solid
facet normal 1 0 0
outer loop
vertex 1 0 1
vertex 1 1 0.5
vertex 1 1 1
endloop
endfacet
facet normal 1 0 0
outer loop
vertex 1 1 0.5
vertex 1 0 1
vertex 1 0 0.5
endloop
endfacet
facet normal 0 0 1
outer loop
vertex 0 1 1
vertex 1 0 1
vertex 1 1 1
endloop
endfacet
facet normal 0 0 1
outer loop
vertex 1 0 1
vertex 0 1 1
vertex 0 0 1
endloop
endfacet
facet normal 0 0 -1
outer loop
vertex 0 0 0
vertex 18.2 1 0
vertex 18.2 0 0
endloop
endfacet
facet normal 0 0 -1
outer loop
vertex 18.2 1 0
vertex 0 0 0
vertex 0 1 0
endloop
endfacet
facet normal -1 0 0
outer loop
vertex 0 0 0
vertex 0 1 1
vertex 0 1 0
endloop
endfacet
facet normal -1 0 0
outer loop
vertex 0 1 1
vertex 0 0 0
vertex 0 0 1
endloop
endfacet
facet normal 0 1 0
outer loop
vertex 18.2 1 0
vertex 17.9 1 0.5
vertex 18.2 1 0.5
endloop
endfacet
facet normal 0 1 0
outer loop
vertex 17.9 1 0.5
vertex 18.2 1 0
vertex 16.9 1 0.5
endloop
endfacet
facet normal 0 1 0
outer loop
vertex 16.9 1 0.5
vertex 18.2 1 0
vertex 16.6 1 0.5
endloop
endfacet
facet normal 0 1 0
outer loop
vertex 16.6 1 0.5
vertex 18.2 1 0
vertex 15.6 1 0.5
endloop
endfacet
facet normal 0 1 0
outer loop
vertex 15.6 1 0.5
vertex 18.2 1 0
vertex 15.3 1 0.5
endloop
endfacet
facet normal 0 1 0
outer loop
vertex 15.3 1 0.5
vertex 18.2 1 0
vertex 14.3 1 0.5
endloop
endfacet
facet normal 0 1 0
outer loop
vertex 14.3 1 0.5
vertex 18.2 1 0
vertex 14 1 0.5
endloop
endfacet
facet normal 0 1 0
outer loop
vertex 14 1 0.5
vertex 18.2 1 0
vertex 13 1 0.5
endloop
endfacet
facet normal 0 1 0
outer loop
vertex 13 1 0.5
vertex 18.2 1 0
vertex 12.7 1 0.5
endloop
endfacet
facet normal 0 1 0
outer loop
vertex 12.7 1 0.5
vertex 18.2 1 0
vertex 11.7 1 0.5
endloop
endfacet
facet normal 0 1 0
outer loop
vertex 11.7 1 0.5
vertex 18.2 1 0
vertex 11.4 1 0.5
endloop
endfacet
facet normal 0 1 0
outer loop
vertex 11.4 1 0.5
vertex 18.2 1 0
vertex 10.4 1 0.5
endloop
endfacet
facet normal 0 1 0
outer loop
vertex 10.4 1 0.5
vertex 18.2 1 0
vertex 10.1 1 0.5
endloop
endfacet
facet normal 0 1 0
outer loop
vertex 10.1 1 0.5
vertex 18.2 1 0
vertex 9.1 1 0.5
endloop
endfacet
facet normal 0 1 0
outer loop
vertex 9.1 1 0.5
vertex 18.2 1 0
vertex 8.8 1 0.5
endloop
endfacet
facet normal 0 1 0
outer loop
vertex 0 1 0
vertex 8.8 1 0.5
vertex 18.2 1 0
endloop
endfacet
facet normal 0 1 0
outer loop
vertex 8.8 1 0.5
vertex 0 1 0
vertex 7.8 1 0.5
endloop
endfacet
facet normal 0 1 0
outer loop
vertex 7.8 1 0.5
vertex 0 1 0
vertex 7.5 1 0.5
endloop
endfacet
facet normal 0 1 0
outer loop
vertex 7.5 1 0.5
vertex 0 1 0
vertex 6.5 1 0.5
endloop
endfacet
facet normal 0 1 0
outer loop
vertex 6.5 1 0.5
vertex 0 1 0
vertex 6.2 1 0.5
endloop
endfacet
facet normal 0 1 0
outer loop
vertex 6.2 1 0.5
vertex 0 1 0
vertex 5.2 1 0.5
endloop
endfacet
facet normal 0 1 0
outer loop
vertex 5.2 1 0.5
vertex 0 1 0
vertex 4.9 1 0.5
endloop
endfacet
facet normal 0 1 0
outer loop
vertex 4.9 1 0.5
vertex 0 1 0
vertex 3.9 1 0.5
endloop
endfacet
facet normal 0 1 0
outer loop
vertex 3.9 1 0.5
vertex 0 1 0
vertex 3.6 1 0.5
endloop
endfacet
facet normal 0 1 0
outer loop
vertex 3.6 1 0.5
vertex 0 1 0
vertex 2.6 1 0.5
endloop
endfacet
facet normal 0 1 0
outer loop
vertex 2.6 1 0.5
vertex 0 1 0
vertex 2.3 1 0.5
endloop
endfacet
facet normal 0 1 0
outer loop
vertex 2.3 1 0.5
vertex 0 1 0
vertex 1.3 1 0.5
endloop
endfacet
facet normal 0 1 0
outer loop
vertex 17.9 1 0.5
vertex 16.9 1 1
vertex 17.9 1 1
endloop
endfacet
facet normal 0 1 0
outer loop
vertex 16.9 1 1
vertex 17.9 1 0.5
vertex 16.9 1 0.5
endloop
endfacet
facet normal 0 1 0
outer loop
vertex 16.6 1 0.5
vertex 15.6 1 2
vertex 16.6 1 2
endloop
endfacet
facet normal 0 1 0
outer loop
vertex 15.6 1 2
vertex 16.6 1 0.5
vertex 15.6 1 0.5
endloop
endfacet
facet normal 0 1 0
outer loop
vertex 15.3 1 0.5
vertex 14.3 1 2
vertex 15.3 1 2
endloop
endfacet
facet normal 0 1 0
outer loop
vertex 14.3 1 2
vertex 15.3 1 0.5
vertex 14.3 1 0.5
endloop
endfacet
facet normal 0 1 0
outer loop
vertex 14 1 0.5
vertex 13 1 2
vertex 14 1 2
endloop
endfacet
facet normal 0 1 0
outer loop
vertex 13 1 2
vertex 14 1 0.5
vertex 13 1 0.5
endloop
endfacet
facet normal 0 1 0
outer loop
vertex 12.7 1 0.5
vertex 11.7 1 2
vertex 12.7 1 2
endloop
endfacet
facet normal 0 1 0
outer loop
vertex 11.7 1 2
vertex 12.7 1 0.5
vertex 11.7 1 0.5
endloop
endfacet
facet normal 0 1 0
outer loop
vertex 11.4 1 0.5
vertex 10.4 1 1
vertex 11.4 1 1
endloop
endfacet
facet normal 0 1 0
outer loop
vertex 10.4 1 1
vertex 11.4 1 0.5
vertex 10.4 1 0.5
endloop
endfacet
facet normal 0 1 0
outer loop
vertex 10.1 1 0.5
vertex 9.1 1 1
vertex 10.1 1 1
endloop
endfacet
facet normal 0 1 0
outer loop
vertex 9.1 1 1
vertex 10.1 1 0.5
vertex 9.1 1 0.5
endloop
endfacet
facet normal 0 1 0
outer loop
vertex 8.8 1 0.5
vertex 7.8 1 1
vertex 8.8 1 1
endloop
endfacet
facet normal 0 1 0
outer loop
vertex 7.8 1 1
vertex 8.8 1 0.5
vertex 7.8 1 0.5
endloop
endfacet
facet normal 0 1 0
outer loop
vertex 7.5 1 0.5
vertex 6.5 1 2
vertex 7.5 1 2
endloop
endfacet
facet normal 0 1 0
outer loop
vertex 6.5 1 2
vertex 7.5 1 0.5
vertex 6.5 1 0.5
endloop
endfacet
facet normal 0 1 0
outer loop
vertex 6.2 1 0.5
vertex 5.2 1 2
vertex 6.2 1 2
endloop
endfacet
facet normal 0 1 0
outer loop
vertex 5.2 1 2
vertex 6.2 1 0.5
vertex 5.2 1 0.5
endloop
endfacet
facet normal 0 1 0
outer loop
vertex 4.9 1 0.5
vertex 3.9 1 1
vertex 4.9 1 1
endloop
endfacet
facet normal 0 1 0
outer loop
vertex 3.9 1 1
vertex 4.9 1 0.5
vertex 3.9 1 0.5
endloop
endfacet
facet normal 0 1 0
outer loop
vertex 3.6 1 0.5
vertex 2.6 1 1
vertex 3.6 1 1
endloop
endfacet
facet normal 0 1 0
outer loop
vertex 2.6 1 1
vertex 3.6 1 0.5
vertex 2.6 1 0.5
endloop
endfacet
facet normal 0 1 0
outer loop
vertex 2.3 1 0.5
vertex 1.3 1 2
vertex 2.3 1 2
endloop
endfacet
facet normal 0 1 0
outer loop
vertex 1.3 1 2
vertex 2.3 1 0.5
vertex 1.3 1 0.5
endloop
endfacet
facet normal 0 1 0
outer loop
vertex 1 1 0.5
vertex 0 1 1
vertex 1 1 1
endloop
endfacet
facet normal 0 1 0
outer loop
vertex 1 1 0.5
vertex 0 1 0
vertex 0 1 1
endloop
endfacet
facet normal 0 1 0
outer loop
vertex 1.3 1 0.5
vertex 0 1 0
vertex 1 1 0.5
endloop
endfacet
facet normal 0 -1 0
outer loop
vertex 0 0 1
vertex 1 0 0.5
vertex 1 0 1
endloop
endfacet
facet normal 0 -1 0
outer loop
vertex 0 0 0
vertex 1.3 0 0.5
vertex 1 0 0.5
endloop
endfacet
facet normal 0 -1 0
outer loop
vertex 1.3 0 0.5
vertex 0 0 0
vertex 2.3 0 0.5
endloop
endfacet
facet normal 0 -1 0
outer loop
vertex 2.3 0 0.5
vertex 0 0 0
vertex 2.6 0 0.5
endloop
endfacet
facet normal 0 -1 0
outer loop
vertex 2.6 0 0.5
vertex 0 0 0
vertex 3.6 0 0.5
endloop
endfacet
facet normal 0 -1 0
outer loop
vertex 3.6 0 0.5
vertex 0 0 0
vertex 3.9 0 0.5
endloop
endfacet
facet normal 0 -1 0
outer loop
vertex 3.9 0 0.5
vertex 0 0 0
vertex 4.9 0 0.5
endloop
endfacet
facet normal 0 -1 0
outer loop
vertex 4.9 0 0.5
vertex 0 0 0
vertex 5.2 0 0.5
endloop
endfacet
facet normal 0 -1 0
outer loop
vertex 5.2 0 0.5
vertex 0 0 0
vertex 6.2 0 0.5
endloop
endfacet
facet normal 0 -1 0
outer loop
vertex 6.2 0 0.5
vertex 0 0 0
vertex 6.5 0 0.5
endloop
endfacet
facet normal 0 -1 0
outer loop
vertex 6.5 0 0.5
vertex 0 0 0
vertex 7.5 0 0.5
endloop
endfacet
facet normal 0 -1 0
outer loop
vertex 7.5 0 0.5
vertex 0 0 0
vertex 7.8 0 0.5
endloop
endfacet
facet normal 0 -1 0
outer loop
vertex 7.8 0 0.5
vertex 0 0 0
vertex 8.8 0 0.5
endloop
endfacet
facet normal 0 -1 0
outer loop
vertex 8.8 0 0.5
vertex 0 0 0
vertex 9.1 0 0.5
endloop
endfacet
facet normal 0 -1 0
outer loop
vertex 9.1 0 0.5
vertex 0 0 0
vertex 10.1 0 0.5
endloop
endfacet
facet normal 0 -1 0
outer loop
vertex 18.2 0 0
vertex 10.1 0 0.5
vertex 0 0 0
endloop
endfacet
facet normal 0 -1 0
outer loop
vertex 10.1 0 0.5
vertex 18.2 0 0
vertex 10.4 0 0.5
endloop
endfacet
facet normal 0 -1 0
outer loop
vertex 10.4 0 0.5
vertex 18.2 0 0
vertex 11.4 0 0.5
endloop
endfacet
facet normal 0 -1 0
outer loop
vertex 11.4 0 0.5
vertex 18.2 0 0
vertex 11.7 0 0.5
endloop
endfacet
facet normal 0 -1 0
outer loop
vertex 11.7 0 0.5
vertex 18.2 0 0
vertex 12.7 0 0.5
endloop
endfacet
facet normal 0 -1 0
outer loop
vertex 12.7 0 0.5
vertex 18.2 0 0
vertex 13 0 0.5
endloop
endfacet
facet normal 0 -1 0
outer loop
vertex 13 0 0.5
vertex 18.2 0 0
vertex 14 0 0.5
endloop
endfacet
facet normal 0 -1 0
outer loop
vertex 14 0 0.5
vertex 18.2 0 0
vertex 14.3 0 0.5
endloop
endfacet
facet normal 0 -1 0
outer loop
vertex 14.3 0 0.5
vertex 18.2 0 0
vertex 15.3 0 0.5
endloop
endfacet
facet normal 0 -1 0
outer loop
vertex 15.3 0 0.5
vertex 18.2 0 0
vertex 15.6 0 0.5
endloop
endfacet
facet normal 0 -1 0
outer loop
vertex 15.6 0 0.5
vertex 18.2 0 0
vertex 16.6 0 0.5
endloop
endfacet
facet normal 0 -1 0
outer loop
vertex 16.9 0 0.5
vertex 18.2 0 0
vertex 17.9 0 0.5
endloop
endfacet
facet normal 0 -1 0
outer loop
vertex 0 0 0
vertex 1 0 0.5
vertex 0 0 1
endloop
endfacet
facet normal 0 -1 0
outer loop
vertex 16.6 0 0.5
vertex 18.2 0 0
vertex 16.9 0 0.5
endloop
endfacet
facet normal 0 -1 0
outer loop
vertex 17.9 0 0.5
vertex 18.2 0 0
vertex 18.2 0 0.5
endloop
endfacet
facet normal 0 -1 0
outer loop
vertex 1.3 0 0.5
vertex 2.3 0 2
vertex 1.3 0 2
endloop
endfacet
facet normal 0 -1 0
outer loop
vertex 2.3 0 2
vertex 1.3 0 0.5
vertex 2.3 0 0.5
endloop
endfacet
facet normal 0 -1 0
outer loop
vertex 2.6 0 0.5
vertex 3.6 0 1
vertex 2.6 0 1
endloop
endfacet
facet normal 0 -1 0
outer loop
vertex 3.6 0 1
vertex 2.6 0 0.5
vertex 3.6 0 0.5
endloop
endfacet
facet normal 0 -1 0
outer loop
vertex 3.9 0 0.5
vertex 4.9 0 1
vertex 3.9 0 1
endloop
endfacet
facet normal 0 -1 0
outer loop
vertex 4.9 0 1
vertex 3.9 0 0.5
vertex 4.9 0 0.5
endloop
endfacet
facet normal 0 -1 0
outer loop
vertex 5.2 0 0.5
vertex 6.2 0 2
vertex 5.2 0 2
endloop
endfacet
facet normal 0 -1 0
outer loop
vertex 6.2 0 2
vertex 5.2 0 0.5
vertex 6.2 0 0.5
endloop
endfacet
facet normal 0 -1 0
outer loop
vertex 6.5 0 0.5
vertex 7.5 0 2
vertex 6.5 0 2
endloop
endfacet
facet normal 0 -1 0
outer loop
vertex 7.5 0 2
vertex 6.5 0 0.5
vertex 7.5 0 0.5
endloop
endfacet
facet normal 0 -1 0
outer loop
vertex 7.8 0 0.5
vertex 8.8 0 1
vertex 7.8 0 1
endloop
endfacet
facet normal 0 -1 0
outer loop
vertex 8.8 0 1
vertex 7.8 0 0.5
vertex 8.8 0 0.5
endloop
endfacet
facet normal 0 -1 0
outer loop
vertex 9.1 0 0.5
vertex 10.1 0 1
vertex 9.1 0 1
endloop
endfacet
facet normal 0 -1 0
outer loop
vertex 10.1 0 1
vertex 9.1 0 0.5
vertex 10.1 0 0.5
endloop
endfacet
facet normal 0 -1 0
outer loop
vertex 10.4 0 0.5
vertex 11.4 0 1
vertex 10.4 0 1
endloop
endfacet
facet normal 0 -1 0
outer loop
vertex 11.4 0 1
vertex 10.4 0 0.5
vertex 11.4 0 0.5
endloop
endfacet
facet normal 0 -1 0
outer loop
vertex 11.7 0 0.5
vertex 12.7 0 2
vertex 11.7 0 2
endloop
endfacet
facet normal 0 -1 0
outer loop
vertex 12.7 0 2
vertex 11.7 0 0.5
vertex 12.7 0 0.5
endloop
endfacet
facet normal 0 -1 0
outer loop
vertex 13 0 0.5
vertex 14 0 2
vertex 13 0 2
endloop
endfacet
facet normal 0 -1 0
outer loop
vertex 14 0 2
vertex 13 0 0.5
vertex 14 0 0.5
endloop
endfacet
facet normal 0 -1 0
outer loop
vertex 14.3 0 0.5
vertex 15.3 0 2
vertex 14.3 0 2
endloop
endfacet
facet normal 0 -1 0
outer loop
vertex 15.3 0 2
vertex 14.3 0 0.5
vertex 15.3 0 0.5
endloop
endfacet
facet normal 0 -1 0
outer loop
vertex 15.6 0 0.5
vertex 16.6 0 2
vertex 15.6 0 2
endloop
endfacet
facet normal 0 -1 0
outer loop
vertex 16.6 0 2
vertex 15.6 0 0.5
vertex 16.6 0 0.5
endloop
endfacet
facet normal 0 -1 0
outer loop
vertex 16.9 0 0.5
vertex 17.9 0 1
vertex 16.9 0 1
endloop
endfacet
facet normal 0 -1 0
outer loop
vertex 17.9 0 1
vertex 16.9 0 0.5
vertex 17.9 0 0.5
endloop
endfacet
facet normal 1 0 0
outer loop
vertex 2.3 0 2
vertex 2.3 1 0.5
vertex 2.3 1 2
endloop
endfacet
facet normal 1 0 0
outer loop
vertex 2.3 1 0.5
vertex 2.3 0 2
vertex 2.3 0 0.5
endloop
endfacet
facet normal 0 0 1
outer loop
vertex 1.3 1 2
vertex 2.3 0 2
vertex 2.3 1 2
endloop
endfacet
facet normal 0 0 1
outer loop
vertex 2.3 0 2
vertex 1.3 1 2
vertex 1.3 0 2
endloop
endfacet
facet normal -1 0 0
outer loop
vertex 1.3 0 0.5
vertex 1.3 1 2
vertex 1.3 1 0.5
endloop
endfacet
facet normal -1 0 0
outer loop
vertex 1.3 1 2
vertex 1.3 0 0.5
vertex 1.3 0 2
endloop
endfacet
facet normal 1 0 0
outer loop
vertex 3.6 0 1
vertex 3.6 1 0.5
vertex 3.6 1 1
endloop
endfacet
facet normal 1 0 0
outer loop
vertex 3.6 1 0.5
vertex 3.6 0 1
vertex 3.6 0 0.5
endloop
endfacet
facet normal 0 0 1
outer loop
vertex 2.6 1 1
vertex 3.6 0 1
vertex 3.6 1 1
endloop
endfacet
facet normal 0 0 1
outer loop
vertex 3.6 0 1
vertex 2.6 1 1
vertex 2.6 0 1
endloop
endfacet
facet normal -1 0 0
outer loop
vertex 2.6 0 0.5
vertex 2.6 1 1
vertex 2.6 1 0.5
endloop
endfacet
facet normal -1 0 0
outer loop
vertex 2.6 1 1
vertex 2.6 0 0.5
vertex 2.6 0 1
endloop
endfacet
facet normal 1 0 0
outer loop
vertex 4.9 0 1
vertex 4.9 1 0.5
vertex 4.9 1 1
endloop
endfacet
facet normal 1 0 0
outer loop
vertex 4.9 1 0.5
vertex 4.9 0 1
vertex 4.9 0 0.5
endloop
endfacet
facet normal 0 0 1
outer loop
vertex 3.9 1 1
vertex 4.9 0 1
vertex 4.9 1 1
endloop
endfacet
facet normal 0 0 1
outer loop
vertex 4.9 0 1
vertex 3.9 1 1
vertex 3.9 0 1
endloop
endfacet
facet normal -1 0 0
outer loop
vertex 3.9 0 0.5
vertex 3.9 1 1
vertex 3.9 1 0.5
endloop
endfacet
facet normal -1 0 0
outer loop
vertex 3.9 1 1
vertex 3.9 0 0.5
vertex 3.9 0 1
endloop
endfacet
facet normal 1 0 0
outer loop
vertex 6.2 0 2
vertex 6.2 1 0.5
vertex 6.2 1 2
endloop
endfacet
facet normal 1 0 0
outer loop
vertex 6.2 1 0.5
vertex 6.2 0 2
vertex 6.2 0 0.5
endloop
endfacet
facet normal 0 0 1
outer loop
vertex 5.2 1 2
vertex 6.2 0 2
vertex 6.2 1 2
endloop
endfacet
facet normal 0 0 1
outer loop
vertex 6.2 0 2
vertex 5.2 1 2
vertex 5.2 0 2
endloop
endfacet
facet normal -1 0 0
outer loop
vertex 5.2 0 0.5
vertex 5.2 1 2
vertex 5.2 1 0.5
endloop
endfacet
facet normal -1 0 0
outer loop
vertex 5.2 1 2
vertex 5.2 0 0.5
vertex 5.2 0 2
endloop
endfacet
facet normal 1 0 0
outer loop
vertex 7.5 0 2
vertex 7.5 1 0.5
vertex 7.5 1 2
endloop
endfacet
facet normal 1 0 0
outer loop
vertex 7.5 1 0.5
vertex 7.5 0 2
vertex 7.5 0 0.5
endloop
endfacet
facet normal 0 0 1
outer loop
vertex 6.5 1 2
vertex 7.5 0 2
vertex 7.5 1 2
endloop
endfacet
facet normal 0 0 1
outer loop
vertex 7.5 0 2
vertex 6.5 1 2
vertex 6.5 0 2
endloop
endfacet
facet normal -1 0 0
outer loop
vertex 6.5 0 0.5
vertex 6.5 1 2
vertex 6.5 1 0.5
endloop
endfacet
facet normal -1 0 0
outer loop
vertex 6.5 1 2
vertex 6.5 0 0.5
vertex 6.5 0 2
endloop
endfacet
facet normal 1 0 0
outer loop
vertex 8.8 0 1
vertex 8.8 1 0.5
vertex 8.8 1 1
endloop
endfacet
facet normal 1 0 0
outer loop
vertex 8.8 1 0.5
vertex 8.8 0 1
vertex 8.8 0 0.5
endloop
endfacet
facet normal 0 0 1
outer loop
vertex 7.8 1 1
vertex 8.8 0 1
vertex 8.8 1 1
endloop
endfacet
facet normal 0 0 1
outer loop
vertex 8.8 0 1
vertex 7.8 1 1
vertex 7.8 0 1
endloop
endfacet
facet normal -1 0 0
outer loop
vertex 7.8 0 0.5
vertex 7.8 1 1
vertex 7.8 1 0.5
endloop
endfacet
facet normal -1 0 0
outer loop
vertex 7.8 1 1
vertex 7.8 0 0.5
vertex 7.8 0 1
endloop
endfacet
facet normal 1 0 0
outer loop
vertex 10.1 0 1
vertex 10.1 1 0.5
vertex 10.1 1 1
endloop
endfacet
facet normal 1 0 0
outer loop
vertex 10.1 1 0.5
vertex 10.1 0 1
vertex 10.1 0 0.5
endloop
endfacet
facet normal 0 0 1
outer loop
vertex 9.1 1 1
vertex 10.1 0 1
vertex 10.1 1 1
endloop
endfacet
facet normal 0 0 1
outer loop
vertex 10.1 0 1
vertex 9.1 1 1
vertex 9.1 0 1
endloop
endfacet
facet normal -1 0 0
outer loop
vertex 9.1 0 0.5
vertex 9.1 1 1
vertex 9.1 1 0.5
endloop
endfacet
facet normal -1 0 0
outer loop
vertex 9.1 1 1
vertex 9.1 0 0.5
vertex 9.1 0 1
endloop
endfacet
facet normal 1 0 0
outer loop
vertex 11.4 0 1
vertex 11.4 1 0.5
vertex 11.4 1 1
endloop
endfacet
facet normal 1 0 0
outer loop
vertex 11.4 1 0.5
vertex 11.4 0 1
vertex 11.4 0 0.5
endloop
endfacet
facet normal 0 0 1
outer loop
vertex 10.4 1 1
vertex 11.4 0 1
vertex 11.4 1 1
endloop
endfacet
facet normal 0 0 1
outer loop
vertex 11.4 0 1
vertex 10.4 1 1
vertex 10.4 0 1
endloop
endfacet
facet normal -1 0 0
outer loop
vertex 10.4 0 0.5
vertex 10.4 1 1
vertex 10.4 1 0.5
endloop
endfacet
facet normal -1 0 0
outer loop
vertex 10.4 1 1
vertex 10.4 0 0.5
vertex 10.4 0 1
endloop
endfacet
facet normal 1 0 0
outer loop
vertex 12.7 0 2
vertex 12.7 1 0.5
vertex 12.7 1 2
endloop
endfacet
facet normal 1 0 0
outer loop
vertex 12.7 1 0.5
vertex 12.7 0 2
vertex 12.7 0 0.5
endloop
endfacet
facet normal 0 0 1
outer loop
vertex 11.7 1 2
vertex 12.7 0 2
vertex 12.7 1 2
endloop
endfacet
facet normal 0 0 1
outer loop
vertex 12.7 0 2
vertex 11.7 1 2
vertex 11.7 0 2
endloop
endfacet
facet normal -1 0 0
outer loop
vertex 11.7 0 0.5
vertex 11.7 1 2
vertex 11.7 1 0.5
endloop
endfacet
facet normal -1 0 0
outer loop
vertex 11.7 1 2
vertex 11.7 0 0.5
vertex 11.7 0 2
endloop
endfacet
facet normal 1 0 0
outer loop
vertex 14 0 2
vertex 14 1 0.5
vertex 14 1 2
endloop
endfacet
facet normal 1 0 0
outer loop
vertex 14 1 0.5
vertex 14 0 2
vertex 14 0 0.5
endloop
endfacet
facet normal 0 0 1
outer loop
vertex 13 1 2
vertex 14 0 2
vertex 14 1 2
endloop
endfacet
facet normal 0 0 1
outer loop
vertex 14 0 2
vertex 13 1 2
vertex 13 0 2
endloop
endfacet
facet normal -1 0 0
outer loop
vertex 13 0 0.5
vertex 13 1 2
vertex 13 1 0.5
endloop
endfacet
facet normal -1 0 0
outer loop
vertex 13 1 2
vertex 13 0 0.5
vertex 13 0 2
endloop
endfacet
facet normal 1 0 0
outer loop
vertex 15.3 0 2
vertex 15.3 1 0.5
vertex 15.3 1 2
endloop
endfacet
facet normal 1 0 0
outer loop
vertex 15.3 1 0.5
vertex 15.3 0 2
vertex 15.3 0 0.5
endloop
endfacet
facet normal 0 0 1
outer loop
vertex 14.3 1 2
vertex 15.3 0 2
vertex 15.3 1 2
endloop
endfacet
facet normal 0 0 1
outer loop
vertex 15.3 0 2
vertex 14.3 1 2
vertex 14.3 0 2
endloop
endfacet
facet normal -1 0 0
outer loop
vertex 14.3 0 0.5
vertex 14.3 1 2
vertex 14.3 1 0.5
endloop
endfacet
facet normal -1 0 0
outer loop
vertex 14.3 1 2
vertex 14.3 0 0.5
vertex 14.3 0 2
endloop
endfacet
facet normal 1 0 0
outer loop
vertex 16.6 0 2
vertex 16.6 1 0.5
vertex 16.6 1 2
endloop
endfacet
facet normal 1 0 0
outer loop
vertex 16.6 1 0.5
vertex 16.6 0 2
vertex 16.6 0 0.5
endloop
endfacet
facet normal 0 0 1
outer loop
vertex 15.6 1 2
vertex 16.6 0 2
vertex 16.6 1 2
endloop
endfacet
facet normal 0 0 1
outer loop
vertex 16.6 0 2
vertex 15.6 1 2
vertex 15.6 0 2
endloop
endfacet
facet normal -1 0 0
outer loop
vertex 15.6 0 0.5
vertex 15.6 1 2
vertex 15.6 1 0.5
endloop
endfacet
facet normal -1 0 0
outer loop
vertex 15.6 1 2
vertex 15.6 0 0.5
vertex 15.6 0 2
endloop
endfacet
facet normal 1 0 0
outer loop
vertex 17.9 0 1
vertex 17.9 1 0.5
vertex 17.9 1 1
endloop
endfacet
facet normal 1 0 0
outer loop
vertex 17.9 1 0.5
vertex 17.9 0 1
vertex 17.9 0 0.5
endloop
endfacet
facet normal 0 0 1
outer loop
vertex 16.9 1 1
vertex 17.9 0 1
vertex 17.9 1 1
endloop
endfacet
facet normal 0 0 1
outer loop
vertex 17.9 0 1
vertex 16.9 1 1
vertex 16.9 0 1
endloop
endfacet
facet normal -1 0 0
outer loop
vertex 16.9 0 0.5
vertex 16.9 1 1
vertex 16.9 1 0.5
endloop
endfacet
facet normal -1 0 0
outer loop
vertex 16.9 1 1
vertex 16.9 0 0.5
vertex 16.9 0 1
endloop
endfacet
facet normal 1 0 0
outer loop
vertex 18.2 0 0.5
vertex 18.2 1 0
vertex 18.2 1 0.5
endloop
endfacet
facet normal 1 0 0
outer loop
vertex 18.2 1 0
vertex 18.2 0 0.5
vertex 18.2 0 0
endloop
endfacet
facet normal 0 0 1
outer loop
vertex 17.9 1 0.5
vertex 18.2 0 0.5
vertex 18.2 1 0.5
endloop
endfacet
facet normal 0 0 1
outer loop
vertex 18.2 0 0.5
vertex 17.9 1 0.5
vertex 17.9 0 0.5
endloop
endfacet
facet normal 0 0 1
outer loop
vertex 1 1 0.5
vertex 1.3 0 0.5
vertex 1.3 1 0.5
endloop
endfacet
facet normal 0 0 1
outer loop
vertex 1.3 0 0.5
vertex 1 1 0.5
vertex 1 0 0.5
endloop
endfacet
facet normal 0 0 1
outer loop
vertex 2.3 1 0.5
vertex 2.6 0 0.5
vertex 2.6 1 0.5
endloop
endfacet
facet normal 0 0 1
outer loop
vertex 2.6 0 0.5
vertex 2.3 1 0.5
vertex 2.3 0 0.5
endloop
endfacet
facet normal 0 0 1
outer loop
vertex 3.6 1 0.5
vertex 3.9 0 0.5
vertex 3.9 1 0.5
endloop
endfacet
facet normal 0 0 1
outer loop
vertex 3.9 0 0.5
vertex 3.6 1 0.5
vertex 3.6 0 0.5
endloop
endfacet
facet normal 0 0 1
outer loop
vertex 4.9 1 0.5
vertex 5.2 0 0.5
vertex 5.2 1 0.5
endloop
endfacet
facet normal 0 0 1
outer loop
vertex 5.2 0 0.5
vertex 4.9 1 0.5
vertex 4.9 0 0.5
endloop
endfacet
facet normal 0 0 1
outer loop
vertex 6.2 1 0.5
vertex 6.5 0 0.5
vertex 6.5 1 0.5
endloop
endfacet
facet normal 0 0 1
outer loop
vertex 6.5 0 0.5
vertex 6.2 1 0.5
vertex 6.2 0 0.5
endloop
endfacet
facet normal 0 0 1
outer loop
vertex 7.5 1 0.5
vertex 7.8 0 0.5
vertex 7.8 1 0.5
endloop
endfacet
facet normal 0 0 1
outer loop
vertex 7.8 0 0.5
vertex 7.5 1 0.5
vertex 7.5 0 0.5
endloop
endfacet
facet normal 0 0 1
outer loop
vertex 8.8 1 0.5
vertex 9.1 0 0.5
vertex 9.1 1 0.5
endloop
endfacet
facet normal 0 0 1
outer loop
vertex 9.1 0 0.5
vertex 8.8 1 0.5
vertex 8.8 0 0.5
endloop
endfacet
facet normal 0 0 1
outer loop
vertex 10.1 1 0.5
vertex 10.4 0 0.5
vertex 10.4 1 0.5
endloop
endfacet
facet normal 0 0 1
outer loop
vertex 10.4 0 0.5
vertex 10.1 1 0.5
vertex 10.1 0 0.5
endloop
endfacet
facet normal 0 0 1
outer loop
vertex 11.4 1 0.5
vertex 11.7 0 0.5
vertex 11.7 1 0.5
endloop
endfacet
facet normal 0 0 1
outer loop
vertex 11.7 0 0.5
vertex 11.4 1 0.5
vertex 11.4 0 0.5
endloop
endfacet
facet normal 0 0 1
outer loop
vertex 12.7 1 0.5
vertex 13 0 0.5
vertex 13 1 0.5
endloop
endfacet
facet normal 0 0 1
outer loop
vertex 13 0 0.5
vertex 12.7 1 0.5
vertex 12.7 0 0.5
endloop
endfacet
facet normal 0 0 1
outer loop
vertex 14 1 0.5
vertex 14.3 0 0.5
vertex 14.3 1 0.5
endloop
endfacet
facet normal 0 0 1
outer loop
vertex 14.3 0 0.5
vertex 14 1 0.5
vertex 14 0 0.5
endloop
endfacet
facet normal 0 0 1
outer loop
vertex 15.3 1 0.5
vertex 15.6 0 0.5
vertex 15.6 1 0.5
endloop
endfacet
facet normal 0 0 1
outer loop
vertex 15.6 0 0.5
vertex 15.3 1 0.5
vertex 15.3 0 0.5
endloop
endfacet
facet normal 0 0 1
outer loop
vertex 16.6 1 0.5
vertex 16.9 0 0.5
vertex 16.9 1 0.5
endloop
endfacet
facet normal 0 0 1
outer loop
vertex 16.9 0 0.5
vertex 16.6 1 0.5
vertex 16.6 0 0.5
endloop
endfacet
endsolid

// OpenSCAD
morse = [0,1,0,0,1,1,0,0,0,1,1,1,1,0];

//offset = 0;
count = 12;
offset = 0.3;

for (a = [0 : len(morse) - 1]) {
    translate([a + (offset*a) ,0,0])
    {
        if(morse[a] == 0)
        {
            cube(size = [1,1,1]);
        }
        if(morse[a] == 1)
        {
            cube(size = [1,1,2]);
        }
    }
}
cube(size = [len(morse)+ (offset*len(morse)),1,0.5]);
